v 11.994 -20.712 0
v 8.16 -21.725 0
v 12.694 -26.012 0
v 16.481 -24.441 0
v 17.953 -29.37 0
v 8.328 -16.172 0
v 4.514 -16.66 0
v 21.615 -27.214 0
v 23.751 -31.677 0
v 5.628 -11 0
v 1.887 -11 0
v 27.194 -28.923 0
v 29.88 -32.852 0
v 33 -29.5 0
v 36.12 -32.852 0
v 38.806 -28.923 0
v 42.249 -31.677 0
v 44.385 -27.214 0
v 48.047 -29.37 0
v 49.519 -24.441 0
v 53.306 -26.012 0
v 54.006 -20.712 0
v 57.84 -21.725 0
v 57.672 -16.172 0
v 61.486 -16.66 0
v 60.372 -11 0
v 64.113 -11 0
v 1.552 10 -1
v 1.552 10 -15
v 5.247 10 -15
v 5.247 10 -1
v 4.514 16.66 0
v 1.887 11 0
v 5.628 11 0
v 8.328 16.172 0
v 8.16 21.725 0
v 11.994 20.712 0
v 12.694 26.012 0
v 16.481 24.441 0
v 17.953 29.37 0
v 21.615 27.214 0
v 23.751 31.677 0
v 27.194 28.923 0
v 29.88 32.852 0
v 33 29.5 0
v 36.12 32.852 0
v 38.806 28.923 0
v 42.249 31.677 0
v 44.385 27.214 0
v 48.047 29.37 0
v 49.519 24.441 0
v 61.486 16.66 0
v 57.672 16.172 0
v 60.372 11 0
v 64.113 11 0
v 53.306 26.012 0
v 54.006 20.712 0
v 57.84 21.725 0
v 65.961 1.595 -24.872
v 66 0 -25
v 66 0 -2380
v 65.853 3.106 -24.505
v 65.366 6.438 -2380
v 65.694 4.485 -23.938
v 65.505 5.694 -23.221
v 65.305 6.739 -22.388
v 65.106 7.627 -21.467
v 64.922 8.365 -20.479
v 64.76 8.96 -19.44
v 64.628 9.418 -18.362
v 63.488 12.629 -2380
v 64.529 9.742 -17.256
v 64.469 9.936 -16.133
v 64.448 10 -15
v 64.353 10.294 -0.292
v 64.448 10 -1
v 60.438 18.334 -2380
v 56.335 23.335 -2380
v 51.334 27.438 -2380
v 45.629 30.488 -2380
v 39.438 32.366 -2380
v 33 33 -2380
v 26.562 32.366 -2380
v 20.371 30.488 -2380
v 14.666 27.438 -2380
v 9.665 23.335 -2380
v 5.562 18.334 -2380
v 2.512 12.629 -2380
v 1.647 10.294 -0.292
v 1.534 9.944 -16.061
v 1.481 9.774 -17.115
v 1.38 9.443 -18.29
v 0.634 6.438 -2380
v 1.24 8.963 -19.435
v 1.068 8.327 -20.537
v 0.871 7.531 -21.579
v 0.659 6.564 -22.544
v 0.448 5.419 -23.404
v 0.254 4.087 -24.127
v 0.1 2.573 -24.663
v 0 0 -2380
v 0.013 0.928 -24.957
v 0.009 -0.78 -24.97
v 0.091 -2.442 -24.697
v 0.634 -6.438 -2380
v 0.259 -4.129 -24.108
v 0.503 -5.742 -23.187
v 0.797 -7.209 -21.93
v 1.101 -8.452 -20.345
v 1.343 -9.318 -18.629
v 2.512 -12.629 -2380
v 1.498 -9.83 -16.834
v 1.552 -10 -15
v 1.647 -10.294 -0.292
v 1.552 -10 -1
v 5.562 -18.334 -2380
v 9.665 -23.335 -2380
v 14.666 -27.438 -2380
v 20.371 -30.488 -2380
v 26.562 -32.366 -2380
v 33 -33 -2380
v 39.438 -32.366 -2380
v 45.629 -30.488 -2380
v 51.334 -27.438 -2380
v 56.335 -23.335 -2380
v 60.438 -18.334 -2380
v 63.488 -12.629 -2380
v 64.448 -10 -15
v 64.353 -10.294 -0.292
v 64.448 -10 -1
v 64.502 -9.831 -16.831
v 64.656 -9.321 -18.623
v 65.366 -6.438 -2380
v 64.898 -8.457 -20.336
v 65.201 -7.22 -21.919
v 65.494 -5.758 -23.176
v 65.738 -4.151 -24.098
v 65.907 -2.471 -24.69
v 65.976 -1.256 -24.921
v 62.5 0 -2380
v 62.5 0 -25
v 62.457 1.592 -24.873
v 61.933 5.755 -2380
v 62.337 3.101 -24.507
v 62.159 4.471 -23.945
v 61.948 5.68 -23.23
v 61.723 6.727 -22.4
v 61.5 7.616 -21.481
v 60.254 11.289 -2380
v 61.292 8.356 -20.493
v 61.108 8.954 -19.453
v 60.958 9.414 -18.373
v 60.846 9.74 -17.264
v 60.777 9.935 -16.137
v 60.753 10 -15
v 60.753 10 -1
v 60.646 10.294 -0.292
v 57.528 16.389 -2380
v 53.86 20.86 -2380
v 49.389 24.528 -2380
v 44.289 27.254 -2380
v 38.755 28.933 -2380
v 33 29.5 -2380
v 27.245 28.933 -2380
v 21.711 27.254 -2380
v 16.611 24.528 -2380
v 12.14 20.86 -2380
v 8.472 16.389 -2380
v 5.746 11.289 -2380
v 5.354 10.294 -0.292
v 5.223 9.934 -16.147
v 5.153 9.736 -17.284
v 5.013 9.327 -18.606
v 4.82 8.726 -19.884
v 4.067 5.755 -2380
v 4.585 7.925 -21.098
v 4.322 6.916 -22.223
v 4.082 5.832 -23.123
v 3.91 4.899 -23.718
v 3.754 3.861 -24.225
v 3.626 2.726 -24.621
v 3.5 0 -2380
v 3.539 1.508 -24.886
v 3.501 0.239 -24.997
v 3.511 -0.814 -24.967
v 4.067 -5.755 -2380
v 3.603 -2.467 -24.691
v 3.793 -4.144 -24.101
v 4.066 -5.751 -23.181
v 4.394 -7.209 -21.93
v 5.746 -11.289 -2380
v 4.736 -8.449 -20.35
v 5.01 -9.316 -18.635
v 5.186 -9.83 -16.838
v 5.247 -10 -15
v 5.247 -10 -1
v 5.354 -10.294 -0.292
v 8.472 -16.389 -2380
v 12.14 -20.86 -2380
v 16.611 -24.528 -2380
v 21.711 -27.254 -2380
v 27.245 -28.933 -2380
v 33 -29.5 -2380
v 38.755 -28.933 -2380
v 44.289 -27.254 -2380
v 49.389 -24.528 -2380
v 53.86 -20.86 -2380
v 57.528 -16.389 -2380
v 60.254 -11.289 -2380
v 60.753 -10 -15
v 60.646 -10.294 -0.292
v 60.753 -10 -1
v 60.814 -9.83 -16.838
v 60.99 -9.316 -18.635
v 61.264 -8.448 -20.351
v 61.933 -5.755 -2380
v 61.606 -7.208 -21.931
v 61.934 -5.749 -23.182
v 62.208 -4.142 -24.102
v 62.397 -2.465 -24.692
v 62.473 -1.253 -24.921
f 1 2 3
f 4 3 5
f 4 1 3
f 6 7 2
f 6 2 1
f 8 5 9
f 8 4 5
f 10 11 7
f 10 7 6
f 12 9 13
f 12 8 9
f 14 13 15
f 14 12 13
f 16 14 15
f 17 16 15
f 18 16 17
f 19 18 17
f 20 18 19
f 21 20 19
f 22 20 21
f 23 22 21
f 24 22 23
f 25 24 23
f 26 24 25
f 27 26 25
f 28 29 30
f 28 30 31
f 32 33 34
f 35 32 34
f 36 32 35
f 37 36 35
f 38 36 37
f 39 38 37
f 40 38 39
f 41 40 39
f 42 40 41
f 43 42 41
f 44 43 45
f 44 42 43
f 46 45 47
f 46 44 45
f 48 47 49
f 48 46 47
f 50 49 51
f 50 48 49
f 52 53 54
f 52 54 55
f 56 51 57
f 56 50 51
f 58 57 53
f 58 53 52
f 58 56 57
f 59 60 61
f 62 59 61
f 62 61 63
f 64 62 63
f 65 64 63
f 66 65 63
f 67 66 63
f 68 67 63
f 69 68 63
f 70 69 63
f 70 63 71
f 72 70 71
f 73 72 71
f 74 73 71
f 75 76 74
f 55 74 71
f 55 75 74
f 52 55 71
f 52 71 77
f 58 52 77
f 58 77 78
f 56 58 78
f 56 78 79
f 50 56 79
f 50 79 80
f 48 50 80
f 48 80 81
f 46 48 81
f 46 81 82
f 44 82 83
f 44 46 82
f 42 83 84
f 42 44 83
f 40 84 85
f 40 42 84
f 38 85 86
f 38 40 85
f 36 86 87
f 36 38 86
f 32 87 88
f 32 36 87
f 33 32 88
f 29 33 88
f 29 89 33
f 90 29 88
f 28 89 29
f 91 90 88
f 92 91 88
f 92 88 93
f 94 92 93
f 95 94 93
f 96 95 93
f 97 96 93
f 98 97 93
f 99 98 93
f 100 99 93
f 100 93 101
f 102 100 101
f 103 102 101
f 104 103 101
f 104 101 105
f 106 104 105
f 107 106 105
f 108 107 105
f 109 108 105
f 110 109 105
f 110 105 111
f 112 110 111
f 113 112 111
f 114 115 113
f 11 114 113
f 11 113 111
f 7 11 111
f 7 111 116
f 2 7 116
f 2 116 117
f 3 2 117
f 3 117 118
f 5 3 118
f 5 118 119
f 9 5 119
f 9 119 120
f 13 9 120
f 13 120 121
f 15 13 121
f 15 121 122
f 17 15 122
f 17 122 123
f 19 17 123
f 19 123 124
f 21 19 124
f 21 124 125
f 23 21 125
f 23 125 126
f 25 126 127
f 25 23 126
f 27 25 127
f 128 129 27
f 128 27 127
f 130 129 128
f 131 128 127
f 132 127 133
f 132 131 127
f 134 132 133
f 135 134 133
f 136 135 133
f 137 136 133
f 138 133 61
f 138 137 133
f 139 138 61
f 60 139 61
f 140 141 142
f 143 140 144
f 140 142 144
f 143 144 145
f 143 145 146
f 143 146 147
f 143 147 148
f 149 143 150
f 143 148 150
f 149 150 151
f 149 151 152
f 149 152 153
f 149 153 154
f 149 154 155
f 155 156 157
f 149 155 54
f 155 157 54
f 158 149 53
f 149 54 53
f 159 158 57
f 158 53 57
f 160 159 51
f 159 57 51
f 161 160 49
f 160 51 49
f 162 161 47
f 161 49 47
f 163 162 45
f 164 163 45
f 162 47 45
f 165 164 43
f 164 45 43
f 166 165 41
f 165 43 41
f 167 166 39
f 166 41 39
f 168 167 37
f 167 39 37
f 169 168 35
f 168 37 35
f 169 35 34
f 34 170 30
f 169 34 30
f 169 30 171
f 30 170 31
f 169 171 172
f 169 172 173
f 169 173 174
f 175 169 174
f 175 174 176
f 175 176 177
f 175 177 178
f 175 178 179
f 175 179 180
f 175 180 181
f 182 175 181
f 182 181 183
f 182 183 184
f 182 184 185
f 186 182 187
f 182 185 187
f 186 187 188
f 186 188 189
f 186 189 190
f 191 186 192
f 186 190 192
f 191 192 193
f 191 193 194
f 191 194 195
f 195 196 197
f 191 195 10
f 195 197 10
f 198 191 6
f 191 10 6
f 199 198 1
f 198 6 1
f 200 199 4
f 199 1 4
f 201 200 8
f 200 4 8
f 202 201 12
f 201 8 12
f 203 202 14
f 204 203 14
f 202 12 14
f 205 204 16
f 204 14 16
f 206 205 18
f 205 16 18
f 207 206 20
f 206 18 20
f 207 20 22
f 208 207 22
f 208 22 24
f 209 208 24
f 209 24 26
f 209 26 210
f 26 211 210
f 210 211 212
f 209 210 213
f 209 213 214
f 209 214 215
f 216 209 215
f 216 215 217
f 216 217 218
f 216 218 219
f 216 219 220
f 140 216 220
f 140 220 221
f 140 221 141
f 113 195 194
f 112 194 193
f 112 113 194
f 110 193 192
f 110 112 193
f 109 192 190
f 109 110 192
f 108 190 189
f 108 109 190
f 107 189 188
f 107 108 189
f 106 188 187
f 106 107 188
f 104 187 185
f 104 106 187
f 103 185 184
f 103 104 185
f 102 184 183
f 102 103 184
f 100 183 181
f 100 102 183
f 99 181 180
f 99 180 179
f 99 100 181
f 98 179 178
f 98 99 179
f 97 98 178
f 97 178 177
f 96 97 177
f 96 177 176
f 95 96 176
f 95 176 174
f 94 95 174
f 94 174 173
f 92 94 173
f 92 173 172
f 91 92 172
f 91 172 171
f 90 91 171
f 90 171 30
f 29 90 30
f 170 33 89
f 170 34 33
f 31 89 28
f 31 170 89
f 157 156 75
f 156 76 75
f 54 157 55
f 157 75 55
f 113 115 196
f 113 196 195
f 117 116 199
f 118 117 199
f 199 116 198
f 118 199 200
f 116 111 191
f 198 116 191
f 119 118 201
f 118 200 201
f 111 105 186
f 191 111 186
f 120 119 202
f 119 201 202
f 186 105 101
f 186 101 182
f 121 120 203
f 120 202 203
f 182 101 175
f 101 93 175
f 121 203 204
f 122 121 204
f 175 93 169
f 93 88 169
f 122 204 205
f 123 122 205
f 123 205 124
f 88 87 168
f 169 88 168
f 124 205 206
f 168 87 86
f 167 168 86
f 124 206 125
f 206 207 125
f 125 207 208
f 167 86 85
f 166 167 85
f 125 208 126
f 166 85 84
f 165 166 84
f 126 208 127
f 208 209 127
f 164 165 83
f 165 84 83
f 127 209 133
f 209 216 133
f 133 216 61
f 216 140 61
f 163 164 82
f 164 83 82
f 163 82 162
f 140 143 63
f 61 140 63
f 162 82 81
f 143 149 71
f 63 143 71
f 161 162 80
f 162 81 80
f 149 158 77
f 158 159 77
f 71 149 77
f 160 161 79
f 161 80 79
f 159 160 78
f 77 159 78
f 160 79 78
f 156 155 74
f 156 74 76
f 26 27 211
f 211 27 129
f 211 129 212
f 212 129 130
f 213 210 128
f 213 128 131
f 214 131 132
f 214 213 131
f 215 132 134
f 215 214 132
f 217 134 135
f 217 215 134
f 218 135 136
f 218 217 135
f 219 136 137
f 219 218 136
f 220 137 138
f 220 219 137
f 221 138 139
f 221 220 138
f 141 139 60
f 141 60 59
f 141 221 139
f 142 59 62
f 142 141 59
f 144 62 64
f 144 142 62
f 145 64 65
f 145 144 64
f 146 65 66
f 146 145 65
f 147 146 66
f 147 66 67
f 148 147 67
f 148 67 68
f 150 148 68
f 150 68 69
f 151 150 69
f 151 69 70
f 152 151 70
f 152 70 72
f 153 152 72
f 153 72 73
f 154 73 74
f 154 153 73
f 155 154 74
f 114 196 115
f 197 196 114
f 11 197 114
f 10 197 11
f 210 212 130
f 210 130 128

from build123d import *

# Parameters (mm, degrees)
SKETCH4_R           = 33
SKETCH4_R_2         = 29.5
BOSS_EXTRUDE1_DEPTH = 2380
CUT_EXTRUDE1_DEPTH  = 67
FILLET1_R           = 1


with BuildPart() as part:
    # Sketch4 → Boss-Extrude1 (new body)
    with BuildSketch(Plane.XY):
        with Locations((33, 0)):
            Circle(SKETCH4_R)
        with Locations((33, 0)):
            Circle(SKETCH4_R_2, mode=Mode.SUBTRACT)
    extrude(amount=-BOSS_EXTRUDE1_DEPTH)

    # Sketch6 → Cut-Extrude1 (cut, through all)
    with BuildSketch(Plane(origin=(0, 0, 0), x_dir=(0, 0, -1), z_dir=(1, 0, 0))):
        with BuildLine():
            Line((0, 10), (0, -10))
            Line((0, -10), (15, -10))
            ThreePointArc((15, -10), (25, 0), (15, 10))
            Line((15, 10), (0, 10))
        make_face()
    extrude(amount=CUT_EXTRUDE1_DEPTH, mode=Mode.SUBTRACT)

    # Fillet1
    fillet1_edges = [part.edges().sort_by_distance(p)[0] for p in [
        (3.39912572, 10, 0),
        (62.60087428, 10, 0),
        (3.39912572, -10, 0),
        (62.60087428, -10, 0),
    ]]
    fillet(fillet1_edges, radius=FILLET1_R)


solid = part.part
